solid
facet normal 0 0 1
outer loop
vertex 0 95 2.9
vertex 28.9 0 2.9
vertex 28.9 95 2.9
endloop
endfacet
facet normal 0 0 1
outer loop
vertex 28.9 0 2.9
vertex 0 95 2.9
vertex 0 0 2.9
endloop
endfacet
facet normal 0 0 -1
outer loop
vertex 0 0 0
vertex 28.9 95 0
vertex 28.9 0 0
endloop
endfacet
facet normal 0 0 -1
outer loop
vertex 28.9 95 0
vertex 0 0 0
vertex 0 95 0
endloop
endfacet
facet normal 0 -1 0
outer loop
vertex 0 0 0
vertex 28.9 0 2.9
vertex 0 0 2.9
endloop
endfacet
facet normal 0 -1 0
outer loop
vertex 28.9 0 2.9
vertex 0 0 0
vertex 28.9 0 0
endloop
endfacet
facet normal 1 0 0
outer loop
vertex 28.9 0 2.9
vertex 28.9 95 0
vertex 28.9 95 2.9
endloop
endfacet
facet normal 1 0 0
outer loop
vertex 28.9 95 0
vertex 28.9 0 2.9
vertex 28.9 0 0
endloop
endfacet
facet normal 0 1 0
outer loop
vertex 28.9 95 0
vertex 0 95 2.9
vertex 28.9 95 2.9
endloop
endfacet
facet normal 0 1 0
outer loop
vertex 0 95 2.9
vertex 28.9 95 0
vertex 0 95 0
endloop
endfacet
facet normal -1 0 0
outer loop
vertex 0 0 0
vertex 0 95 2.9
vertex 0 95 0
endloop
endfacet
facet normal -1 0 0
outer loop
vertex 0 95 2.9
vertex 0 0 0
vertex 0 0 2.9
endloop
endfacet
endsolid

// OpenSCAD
pico_w_width = 21;
pico_w_length = 51;
margin = 1;

side_panel_height = 40;
side_panel_thickness = 2;

base_thickness = 4;
base_width = pico_w_width + margin * 2 + side_panel_thickness * 2;
base_length = 100;

module square_frame(groove_width, groove_length, groove_height) {
        cube([groove_width, groove_length, groove_height]);
}

// Example usage
square_frame(base_width + 1.9, base_length - 5, 2.9);  // Call the function with desired parameters
